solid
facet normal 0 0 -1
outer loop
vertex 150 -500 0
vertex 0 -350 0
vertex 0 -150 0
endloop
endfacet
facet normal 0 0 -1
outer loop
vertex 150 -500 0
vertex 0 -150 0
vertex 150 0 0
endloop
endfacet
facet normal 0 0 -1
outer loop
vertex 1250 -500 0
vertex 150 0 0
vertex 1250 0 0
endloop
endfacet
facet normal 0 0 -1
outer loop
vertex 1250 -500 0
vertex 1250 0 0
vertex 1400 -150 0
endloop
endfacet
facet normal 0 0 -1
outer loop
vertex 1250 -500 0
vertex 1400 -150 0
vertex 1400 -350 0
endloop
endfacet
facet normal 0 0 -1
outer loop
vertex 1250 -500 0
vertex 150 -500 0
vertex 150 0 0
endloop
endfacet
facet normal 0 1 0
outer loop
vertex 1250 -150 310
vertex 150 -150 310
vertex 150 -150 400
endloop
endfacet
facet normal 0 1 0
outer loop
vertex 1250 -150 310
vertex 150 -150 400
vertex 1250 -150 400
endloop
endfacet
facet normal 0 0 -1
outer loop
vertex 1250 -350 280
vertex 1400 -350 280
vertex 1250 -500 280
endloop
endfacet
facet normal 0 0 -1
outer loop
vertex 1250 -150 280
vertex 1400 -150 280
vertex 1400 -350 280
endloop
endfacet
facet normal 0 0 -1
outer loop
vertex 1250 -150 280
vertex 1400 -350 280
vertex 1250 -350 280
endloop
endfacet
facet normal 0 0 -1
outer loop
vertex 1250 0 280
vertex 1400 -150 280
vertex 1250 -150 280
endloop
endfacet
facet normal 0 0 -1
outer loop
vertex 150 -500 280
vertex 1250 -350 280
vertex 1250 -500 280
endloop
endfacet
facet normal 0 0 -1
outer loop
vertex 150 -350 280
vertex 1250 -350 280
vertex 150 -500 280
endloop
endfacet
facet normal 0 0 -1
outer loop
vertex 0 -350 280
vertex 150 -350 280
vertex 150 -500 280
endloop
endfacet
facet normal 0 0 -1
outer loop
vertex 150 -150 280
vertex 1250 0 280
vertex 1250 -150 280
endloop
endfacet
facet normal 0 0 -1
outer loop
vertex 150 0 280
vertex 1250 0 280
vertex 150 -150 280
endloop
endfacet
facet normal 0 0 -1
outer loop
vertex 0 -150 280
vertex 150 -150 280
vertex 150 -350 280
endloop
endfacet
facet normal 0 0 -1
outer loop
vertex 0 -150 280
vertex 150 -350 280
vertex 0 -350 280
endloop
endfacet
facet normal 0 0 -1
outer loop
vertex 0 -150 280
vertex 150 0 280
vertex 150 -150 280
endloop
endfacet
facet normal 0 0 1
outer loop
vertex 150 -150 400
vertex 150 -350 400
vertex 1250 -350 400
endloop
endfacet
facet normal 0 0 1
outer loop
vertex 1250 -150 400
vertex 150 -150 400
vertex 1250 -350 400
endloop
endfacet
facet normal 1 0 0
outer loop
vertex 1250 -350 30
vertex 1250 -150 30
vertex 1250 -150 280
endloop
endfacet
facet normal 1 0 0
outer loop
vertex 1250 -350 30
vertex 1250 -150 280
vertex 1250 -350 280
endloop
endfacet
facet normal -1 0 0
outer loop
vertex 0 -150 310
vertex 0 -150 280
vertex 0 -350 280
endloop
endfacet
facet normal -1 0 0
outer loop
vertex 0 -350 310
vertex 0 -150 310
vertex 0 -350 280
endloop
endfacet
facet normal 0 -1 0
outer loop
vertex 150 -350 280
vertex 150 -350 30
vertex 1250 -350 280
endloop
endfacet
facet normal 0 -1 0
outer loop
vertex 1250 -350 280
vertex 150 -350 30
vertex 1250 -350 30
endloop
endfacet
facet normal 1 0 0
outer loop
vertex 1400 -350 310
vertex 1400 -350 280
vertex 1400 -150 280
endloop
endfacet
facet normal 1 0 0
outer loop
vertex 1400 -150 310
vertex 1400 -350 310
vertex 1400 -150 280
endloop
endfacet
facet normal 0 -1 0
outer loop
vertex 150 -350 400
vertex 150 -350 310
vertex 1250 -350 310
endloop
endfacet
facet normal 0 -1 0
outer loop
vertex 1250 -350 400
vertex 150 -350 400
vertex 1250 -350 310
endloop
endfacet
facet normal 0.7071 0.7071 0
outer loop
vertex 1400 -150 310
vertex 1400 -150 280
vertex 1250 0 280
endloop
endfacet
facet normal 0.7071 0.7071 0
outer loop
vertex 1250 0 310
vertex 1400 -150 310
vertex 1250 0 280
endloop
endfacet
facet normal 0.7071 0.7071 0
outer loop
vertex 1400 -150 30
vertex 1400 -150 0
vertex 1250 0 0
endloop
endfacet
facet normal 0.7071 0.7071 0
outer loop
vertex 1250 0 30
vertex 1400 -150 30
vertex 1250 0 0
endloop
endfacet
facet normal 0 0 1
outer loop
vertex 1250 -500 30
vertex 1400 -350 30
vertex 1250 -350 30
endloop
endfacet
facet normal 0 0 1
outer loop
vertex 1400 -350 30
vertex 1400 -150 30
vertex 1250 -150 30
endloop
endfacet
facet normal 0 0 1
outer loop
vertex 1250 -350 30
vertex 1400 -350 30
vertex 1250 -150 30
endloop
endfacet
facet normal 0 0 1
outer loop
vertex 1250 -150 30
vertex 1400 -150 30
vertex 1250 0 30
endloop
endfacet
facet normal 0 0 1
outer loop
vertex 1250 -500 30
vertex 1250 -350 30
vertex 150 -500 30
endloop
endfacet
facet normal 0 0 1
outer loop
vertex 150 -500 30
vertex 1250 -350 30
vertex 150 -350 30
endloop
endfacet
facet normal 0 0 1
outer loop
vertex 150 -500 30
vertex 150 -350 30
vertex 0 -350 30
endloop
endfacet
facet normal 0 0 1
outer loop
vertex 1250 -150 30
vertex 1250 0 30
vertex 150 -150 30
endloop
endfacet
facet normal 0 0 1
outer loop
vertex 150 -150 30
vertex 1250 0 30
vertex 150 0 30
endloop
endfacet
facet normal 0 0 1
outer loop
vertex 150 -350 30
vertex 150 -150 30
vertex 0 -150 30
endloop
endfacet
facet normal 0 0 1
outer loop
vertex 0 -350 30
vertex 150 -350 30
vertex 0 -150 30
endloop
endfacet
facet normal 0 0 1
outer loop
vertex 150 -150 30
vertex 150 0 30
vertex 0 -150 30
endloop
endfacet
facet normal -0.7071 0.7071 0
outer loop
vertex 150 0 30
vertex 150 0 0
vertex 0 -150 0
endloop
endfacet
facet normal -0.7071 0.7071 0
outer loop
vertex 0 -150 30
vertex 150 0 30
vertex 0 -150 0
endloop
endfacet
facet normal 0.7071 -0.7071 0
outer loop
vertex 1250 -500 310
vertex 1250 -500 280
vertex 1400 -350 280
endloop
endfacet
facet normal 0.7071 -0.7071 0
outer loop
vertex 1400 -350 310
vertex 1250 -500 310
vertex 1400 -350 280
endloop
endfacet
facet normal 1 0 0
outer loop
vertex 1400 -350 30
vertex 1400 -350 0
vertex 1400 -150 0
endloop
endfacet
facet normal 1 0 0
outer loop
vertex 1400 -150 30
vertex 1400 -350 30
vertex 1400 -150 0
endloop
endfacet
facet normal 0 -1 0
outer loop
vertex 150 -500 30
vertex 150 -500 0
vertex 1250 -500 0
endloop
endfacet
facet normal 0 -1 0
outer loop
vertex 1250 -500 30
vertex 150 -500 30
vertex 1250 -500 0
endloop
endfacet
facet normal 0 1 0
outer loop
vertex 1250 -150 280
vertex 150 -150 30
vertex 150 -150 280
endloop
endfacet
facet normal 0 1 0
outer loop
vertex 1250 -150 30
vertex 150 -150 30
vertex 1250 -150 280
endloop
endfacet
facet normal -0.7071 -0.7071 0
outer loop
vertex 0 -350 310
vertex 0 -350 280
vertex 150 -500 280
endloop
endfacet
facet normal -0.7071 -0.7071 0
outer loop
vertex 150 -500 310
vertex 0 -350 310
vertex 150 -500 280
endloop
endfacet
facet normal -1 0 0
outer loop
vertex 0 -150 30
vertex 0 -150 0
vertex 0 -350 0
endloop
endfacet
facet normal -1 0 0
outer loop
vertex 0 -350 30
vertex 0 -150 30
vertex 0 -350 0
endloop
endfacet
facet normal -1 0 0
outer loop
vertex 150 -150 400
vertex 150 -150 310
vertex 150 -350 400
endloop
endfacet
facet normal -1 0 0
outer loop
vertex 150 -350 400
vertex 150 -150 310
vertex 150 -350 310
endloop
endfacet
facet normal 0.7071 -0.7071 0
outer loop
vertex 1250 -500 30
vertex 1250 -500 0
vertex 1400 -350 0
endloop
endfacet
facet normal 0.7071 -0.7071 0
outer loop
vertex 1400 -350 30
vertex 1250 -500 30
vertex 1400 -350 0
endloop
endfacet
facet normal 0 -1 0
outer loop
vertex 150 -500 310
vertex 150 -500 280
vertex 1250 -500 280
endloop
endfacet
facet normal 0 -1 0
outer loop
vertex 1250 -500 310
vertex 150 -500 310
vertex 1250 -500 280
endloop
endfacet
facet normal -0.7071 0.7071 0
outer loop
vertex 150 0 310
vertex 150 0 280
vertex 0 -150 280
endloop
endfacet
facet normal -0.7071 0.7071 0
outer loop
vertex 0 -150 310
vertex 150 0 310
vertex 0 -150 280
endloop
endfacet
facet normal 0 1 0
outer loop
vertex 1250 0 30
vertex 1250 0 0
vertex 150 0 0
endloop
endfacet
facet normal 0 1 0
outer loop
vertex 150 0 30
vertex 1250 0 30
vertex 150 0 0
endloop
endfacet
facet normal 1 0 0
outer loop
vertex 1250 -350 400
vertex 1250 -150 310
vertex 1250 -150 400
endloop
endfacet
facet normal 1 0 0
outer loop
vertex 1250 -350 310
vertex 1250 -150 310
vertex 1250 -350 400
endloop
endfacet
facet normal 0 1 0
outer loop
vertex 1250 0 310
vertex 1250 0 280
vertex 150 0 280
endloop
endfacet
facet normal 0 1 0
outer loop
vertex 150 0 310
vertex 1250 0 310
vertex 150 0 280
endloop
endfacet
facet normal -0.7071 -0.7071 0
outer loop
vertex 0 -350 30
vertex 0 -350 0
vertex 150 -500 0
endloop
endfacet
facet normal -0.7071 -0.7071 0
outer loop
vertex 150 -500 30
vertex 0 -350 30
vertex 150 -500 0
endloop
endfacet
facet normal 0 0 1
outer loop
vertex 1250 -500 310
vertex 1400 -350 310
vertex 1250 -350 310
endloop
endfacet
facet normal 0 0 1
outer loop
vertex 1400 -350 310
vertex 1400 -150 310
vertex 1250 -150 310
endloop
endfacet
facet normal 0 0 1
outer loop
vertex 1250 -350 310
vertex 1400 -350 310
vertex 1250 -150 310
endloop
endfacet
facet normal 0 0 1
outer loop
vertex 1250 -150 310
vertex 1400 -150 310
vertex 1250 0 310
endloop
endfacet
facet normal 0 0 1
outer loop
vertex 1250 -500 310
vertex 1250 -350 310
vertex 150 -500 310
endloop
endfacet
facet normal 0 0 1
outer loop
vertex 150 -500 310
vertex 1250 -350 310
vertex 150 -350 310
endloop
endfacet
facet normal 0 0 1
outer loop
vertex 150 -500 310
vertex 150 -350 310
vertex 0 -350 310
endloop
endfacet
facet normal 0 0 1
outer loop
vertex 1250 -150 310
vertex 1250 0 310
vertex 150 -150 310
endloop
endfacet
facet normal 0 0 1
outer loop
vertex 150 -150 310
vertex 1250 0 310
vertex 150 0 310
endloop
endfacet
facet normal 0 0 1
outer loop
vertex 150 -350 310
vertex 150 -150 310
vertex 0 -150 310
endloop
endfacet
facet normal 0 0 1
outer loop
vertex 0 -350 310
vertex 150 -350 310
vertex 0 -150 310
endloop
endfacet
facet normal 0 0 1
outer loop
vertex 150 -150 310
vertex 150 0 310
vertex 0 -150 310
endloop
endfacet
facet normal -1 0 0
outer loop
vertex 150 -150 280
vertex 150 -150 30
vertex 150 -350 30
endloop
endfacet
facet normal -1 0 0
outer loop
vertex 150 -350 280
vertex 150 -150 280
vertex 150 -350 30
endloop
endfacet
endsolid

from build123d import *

# Parameters (mm, degrees)
F1_DEPTH = 400
F2_W     = 1400
F2_H     = 250
F2_H_2   = 90
F3_DEPTH = 500.001
F4_W     = 1100
F4_H     = 200
F5_DEPTH = 400


with BuildPart() as f1:
    # F0 (on Top) → F1 (new body)
    with BuildSketch(Plane.XY):
        Polygon((1250, 0), (150, 0), (0, -150), (0, -350), (150, -500), (1250, -500), (1400, -350), (1400, -150), align=None)
    extrude(amount=F1_DEPTH)

    # F2 (on face) → F3 (cut, through all)
    with BuildSketch(Plane(origin=(0, 0, 0), x_dir=(-1, 0, 0), z_dir=(0, 1, 0))):
        with Locations((-700, 155)):
            Rectangle(F2_W, F2_H)
        with Locations((-700, 355)):
            Rectangle(F2_W, F2_H_2)
    extrude(amount=-F3_DEPTH, mode=Mode.SUBTRACT)

    # F4 (on face) → F5 (join)
    with BuildSketch(Plane(origin=(0, 0, 0), x_dir=(1, 0, 0), z_dir=(0, 0, -1))):
        with Locations((700, 250)):
            Rectangle(F4_W, F4_H)
    extrude(amount=-F5_DEPTH)


solid = f1.part
